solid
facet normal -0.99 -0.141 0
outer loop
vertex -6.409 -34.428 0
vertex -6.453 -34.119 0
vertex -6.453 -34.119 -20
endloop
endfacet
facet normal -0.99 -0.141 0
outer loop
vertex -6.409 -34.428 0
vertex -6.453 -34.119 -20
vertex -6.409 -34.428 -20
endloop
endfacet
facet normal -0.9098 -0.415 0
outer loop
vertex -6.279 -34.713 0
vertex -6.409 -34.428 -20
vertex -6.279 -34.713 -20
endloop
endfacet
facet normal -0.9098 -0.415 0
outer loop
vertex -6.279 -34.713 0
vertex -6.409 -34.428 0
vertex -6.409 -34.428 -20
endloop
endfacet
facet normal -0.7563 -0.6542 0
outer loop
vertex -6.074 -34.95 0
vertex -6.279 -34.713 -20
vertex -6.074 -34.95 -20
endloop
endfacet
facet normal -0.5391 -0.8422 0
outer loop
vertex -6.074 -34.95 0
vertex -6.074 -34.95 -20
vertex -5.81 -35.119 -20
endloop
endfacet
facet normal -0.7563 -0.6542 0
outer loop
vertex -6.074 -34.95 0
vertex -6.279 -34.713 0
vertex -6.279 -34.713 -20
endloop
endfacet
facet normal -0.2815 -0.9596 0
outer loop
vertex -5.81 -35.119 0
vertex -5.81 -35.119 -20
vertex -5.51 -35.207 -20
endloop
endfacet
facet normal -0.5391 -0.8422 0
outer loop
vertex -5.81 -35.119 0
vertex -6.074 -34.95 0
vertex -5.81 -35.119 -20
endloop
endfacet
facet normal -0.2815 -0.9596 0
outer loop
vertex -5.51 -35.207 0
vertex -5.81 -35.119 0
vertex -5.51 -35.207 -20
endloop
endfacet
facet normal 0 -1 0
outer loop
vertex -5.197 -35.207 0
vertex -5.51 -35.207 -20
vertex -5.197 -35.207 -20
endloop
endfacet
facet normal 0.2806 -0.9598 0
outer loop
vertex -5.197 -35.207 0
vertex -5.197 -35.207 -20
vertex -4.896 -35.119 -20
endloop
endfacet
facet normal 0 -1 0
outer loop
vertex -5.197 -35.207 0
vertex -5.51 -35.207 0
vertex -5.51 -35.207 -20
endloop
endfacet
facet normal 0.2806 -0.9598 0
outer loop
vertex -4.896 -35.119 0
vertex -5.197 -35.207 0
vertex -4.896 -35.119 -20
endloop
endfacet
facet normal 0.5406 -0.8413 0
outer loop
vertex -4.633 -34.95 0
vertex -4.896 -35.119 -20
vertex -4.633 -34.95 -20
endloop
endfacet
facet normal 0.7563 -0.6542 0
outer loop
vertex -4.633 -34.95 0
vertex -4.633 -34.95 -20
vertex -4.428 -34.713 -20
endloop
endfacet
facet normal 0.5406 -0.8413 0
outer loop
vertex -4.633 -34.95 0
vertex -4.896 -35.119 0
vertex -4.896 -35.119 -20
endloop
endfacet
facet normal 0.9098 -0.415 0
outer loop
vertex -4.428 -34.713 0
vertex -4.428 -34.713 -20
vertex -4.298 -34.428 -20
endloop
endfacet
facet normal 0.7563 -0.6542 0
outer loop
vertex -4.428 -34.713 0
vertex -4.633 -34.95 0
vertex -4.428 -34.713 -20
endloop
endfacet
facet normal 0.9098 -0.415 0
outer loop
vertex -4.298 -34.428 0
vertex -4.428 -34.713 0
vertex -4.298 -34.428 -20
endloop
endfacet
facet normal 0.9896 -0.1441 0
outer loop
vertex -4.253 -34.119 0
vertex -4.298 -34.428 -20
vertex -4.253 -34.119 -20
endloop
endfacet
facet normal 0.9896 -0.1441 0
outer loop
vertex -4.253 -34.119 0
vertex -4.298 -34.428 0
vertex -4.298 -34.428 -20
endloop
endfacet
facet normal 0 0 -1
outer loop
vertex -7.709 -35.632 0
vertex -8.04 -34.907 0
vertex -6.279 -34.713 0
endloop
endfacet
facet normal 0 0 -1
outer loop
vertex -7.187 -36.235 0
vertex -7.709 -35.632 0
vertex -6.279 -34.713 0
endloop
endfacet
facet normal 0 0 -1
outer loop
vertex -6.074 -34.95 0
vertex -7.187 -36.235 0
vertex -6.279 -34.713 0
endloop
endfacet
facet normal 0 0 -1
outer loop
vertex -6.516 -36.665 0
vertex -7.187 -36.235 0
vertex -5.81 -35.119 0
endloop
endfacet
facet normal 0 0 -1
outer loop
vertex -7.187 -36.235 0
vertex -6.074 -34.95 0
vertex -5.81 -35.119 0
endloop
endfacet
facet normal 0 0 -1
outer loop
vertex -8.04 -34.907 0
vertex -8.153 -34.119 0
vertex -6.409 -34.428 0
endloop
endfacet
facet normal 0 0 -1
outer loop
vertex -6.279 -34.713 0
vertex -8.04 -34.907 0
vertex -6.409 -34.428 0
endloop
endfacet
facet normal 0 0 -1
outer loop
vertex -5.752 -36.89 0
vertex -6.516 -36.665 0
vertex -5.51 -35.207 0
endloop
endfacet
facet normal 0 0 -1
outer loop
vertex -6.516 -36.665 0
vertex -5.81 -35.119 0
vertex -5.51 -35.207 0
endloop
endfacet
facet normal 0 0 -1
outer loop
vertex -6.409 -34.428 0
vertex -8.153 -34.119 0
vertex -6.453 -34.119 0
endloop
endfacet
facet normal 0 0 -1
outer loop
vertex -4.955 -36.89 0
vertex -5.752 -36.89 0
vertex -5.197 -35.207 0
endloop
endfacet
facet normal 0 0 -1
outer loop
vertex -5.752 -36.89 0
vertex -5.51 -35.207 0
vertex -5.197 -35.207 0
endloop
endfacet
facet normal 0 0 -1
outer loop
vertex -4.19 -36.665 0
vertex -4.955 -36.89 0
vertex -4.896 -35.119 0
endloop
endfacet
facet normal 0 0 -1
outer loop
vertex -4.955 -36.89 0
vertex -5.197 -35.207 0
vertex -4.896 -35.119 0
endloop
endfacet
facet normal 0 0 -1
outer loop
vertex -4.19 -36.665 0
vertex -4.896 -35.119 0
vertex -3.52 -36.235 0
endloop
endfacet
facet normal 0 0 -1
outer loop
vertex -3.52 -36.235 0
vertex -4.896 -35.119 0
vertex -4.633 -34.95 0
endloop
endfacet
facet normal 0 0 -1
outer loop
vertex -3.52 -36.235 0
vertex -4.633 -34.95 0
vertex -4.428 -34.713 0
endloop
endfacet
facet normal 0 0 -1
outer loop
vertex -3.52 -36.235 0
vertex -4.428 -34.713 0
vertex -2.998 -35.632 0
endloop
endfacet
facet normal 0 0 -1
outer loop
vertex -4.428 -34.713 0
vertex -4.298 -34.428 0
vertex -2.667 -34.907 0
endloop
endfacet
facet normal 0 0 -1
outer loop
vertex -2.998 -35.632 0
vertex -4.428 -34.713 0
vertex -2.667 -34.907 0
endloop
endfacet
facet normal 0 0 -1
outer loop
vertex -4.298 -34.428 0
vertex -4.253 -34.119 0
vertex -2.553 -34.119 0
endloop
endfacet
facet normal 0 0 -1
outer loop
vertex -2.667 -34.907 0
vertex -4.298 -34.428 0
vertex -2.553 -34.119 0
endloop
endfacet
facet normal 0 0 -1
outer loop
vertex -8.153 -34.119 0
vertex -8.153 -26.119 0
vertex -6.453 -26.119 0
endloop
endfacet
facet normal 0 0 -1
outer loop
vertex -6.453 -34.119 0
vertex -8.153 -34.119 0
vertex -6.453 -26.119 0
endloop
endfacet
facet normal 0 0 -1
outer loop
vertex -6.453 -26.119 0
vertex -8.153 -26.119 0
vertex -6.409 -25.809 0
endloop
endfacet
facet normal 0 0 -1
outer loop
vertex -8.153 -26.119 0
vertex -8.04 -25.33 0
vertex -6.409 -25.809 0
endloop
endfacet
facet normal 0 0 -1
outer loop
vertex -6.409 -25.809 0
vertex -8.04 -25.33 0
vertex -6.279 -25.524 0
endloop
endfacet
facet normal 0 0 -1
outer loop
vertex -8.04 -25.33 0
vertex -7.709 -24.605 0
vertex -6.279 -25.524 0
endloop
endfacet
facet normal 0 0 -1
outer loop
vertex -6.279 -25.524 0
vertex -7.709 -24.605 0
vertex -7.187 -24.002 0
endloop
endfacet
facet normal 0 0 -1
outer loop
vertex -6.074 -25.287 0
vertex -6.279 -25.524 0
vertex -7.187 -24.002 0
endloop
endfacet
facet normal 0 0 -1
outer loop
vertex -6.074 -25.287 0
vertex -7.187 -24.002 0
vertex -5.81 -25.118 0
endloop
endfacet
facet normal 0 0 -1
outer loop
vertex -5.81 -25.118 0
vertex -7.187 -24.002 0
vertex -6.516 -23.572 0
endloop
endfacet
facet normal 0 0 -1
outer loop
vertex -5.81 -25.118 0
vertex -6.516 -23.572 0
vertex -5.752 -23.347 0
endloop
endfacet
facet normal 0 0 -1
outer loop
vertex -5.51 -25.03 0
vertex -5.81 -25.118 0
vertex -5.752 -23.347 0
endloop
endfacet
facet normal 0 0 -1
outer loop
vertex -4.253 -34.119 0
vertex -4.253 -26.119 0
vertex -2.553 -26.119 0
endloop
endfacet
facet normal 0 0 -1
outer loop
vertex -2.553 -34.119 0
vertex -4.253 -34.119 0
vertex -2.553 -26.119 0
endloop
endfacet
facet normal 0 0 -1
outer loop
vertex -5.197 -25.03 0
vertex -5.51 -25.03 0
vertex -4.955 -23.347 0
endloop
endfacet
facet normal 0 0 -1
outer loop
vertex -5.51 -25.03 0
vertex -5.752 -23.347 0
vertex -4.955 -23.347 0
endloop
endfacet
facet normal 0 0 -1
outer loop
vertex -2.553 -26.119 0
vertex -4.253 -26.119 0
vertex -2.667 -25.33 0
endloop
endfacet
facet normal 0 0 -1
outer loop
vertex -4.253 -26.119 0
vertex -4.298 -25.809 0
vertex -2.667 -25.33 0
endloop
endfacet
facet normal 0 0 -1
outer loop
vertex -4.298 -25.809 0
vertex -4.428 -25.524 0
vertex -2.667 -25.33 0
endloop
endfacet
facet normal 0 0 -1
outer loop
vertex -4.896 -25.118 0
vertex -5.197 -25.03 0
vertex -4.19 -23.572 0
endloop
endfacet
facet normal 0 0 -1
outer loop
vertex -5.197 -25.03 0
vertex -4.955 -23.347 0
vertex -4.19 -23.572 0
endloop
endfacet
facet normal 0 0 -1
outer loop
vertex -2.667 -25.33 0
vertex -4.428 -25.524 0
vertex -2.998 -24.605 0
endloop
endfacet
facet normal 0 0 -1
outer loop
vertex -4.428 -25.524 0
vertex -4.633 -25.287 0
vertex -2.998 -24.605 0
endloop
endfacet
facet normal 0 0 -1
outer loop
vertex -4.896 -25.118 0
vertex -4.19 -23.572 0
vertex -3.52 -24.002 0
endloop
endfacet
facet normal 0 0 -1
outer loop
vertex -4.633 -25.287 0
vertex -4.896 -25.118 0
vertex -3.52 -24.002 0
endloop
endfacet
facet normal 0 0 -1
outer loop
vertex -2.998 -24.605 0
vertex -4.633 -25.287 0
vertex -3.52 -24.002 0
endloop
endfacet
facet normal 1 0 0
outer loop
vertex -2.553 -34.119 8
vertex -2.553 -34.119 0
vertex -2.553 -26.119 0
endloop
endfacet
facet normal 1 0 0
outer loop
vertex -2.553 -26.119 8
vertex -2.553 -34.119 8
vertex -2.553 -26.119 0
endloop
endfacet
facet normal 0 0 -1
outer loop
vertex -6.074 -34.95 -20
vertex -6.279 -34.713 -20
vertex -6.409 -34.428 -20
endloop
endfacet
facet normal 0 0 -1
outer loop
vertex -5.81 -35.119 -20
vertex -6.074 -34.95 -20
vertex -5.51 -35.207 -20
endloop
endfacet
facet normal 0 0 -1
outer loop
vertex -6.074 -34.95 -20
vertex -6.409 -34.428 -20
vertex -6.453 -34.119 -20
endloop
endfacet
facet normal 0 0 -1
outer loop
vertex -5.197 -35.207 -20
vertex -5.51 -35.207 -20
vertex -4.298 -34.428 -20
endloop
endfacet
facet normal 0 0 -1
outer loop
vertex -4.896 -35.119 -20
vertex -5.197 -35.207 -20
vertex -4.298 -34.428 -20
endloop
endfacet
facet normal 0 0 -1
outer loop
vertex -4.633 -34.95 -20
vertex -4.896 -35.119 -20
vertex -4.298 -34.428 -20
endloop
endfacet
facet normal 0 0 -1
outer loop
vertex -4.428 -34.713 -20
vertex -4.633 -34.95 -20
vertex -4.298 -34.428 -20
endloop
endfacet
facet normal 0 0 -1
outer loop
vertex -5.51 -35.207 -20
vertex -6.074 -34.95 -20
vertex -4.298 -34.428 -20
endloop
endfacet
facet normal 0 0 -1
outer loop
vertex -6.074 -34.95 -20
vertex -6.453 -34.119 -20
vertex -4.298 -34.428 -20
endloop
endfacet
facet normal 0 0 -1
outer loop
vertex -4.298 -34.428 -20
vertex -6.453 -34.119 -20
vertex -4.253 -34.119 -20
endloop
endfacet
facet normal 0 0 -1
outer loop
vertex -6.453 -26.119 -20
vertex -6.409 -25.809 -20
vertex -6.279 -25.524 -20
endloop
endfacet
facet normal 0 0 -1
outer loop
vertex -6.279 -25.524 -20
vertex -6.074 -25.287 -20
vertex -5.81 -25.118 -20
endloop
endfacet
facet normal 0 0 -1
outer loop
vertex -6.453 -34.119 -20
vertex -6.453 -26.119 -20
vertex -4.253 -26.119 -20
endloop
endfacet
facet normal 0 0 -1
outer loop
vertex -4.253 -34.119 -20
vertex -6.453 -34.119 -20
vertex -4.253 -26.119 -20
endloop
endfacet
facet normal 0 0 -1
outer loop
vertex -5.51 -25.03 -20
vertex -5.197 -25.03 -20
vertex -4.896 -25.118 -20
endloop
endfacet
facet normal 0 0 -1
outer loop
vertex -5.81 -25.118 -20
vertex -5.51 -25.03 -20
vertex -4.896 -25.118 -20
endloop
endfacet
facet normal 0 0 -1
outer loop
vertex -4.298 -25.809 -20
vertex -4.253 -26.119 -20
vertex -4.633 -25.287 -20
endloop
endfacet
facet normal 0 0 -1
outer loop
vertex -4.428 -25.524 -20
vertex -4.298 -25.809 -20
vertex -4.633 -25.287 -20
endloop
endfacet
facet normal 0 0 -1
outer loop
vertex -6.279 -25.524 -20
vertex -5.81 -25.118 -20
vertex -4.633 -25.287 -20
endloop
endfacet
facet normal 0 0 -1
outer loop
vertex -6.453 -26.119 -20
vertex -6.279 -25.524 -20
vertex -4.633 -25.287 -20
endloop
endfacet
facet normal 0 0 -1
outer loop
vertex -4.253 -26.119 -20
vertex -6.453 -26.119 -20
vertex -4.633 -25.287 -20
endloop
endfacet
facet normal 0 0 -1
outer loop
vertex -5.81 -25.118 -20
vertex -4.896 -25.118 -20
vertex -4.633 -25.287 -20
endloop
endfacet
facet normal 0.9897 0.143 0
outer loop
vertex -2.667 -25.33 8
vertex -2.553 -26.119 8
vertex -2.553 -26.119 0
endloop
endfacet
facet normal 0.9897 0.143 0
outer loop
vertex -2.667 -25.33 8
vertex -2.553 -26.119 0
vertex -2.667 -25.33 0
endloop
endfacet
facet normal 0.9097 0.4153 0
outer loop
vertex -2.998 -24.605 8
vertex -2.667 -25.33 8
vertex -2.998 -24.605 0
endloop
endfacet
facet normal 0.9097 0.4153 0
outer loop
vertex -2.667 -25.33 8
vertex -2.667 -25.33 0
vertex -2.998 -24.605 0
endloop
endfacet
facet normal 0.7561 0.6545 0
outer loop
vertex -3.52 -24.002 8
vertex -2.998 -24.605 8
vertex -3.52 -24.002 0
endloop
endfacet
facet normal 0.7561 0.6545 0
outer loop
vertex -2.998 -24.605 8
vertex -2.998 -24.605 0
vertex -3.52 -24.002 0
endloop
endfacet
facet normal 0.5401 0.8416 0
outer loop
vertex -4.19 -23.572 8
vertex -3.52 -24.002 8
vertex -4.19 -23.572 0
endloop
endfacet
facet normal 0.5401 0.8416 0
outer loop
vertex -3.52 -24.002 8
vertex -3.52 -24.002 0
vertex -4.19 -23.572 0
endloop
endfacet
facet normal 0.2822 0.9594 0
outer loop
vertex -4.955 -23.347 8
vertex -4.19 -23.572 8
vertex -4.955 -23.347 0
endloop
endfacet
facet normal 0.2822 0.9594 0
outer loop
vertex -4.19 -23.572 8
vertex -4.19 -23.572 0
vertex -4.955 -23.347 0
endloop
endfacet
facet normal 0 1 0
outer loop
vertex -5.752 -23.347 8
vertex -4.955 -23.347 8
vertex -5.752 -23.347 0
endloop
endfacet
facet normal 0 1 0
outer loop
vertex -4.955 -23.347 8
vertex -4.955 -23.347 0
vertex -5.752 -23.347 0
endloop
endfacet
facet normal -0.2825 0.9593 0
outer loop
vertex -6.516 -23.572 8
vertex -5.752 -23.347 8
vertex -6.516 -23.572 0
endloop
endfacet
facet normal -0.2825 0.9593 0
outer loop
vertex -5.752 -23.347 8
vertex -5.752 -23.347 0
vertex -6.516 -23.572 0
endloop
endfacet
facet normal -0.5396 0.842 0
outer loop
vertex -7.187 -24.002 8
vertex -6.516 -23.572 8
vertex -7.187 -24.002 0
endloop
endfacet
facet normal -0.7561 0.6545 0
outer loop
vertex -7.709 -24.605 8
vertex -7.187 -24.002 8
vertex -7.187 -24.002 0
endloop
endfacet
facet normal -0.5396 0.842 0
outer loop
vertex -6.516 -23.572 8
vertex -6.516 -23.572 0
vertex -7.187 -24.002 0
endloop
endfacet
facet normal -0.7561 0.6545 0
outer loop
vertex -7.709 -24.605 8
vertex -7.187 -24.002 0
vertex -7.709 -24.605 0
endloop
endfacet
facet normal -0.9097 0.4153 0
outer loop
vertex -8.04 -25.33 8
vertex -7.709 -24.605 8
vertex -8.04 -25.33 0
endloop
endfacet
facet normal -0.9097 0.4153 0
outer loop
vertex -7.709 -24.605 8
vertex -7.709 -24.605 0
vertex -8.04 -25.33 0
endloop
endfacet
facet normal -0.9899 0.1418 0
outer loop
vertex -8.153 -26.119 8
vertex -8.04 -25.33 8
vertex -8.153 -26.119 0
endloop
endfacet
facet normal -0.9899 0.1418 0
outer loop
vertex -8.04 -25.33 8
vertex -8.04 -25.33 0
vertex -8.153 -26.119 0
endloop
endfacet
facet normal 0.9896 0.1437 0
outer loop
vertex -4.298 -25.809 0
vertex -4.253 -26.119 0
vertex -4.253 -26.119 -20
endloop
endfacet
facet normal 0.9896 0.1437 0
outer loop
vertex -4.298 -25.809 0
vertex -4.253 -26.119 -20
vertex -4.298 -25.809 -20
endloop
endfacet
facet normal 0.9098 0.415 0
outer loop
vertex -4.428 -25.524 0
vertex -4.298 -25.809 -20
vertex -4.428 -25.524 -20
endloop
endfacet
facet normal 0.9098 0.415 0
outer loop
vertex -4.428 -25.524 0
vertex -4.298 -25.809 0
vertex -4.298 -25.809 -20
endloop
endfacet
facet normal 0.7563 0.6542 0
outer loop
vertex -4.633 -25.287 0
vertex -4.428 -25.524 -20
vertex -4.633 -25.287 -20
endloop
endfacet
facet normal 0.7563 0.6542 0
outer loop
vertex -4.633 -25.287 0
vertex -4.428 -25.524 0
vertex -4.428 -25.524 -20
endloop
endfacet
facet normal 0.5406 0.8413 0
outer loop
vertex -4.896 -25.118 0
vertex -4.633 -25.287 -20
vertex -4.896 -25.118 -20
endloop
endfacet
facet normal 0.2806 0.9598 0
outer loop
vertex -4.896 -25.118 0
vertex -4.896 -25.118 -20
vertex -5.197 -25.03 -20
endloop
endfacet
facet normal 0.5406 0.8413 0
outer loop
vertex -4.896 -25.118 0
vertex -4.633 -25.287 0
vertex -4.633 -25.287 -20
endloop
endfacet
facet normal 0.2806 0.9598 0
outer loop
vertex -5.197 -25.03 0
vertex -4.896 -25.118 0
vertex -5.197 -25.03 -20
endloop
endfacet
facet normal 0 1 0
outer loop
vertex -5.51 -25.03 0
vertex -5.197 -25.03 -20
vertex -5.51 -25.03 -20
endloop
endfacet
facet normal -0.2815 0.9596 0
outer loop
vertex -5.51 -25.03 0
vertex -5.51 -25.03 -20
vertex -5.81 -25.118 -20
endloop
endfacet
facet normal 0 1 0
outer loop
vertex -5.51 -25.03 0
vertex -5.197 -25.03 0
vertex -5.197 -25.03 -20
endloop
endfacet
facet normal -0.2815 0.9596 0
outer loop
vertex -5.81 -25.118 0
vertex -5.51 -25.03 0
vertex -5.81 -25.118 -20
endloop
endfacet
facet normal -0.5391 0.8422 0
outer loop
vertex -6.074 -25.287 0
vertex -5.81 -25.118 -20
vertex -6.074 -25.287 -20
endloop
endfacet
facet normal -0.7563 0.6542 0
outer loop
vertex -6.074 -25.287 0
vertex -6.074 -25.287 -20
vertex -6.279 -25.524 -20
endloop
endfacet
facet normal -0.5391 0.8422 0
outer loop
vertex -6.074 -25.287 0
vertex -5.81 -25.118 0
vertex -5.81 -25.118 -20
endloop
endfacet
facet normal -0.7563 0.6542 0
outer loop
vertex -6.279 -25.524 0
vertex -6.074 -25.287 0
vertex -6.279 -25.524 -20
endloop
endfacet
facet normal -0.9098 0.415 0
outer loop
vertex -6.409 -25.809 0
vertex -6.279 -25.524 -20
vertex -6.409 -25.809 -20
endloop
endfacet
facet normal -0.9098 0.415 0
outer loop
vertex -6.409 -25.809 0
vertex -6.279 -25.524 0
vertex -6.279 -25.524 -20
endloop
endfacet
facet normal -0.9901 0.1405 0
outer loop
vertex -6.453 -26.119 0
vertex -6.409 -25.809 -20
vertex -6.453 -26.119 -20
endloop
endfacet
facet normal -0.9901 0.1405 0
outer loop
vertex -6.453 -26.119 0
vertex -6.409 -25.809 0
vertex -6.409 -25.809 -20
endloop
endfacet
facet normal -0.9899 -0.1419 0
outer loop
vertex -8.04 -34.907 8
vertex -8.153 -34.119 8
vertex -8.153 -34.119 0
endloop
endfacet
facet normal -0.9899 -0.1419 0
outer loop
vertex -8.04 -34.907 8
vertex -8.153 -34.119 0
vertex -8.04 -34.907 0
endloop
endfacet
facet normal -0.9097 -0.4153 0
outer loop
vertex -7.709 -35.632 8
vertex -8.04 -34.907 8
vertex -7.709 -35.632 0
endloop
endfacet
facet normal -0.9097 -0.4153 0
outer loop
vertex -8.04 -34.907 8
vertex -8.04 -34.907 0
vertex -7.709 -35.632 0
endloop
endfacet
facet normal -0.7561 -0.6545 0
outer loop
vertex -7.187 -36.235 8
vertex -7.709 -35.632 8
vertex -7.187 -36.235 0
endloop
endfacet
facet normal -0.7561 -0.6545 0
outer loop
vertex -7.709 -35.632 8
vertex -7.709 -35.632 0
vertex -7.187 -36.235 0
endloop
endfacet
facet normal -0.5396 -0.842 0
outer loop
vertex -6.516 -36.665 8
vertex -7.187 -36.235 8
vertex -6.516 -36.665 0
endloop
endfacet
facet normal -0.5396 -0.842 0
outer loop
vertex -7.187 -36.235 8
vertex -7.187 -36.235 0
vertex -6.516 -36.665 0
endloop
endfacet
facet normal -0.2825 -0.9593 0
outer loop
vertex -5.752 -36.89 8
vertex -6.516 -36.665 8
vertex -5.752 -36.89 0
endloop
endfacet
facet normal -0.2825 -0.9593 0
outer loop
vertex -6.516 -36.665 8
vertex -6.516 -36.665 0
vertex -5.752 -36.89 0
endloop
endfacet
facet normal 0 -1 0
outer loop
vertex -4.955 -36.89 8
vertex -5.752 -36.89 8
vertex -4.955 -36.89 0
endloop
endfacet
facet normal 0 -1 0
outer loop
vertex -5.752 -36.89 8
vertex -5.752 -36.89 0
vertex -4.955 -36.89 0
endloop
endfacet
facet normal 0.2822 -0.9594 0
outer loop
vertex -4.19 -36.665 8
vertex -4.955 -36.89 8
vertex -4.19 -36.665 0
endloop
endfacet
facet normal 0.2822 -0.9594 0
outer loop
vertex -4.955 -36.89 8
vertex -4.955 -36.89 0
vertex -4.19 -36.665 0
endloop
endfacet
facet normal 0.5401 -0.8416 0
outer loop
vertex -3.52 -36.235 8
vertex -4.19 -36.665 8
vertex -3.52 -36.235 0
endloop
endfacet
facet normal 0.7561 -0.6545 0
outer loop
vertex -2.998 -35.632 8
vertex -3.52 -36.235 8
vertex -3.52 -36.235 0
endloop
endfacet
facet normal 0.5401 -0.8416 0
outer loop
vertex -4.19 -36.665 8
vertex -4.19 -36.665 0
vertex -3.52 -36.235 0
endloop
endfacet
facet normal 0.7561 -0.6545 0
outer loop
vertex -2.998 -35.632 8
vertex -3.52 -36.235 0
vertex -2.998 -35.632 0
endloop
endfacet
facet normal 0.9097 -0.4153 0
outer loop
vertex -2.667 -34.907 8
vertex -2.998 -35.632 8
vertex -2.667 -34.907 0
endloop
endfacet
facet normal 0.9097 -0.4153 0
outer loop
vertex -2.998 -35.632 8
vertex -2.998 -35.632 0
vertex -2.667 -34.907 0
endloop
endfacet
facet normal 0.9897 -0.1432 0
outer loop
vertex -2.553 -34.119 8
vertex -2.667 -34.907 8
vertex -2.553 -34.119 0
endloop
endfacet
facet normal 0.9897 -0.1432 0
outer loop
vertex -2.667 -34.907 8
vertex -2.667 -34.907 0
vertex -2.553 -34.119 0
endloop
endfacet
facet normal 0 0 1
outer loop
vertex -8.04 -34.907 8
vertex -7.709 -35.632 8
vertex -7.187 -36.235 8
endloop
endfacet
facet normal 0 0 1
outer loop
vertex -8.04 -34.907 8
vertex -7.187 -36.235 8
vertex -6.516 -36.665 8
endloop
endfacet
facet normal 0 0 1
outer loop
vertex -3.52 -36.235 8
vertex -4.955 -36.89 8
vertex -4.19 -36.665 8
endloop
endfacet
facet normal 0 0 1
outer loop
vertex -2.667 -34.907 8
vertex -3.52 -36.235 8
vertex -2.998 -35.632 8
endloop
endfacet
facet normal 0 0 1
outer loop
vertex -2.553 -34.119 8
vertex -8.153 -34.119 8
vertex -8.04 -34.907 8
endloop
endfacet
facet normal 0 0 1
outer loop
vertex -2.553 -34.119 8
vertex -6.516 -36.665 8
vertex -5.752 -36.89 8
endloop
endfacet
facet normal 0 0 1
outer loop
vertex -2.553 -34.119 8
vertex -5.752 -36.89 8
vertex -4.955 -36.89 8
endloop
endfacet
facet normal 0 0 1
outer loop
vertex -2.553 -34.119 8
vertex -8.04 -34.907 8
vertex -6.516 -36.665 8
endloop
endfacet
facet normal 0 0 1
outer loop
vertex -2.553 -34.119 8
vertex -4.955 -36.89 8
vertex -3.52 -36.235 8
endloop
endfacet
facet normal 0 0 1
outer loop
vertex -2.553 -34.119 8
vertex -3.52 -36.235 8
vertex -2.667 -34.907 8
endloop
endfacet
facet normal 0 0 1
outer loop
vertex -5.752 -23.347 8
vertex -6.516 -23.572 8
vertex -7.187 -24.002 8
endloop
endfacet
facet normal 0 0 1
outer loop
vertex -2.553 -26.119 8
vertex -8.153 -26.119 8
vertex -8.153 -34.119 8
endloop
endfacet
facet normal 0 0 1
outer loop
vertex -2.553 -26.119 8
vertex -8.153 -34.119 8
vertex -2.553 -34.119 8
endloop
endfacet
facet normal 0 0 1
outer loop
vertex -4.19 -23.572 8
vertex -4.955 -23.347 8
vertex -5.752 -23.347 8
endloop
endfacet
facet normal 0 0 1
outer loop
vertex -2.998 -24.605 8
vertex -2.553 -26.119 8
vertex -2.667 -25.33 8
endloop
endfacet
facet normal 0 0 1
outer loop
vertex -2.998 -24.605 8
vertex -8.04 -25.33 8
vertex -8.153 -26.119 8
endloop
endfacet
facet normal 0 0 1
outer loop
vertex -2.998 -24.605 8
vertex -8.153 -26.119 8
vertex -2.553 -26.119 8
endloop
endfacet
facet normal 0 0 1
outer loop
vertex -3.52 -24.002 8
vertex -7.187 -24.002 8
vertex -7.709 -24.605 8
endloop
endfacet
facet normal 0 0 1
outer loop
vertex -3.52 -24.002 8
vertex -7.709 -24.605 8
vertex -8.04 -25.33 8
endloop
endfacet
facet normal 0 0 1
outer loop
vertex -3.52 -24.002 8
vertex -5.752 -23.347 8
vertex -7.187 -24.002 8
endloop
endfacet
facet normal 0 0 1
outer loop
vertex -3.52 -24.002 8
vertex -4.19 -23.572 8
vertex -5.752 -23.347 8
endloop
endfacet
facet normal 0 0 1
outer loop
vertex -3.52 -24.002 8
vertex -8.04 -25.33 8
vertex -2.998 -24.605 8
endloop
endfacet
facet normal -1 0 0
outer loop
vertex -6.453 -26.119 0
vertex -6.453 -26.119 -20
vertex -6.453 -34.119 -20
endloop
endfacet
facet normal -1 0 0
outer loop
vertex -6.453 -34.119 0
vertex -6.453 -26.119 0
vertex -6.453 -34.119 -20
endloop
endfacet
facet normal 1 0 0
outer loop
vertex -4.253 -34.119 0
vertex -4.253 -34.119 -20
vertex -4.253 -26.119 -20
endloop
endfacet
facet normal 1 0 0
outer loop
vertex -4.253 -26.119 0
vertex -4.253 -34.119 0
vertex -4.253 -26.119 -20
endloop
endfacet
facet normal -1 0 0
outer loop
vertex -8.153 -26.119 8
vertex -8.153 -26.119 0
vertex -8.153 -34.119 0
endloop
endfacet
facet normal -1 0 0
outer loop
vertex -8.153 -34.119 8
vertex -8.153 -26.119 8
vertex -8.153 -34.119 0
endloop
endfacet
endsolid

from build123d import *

# Parameters (mm, degrees)
EXTRUDE_1_DEPTH = 20
EXTRUDE_2_DEPTH = 8


with BuildPart() as part:
    # 草图1 → 凸台-拉伸1 (new body)
    with BuildSketch(Plane.XY):
        with BuildLine():
            Line((-6.453218026, -26.118509408), (-6.453218026, -34.118509408))
            ThreePointArc((-6.453218026, -34.118509408), (-5.353218026, -35.218509408), (-4.253218026, -34.118509408))
            Line((-4.253218026, -34.118509408), (-4.253218026, -26.118509408))
            ThreePointArc((-4.253218026, -26.118509408), (-5.353218026, -25.018509408), (-6.453218026, -26.118509408))
        make_face()
    extrude(amount=-EXTRUDE_1_DEPTH)

    # 草图2 → 凸台-拉伸2 (add)
    with BuildSketch(Plane.XY):
        with BuildLine():
            Line((-2.553218026, -34.118509408), (-2.553218026, -26.118509408))
            ThreePointArc((-2.553218026, -26.118509408), (-5.353218026, -23.318509408), (-8.153218026, -26.118509408))
            Line((-8.153218026, -26.118509408), (-8.153218026, -34.118509408))
            ThreePointArc((-8.153218026, -34.118509408), (-5.353218026, -36.918509408), (-2.553218026, -34.118509408))
        make_face()
    extrude(amount=EXTRUDE_2_DEPTH)


solid = part.part
